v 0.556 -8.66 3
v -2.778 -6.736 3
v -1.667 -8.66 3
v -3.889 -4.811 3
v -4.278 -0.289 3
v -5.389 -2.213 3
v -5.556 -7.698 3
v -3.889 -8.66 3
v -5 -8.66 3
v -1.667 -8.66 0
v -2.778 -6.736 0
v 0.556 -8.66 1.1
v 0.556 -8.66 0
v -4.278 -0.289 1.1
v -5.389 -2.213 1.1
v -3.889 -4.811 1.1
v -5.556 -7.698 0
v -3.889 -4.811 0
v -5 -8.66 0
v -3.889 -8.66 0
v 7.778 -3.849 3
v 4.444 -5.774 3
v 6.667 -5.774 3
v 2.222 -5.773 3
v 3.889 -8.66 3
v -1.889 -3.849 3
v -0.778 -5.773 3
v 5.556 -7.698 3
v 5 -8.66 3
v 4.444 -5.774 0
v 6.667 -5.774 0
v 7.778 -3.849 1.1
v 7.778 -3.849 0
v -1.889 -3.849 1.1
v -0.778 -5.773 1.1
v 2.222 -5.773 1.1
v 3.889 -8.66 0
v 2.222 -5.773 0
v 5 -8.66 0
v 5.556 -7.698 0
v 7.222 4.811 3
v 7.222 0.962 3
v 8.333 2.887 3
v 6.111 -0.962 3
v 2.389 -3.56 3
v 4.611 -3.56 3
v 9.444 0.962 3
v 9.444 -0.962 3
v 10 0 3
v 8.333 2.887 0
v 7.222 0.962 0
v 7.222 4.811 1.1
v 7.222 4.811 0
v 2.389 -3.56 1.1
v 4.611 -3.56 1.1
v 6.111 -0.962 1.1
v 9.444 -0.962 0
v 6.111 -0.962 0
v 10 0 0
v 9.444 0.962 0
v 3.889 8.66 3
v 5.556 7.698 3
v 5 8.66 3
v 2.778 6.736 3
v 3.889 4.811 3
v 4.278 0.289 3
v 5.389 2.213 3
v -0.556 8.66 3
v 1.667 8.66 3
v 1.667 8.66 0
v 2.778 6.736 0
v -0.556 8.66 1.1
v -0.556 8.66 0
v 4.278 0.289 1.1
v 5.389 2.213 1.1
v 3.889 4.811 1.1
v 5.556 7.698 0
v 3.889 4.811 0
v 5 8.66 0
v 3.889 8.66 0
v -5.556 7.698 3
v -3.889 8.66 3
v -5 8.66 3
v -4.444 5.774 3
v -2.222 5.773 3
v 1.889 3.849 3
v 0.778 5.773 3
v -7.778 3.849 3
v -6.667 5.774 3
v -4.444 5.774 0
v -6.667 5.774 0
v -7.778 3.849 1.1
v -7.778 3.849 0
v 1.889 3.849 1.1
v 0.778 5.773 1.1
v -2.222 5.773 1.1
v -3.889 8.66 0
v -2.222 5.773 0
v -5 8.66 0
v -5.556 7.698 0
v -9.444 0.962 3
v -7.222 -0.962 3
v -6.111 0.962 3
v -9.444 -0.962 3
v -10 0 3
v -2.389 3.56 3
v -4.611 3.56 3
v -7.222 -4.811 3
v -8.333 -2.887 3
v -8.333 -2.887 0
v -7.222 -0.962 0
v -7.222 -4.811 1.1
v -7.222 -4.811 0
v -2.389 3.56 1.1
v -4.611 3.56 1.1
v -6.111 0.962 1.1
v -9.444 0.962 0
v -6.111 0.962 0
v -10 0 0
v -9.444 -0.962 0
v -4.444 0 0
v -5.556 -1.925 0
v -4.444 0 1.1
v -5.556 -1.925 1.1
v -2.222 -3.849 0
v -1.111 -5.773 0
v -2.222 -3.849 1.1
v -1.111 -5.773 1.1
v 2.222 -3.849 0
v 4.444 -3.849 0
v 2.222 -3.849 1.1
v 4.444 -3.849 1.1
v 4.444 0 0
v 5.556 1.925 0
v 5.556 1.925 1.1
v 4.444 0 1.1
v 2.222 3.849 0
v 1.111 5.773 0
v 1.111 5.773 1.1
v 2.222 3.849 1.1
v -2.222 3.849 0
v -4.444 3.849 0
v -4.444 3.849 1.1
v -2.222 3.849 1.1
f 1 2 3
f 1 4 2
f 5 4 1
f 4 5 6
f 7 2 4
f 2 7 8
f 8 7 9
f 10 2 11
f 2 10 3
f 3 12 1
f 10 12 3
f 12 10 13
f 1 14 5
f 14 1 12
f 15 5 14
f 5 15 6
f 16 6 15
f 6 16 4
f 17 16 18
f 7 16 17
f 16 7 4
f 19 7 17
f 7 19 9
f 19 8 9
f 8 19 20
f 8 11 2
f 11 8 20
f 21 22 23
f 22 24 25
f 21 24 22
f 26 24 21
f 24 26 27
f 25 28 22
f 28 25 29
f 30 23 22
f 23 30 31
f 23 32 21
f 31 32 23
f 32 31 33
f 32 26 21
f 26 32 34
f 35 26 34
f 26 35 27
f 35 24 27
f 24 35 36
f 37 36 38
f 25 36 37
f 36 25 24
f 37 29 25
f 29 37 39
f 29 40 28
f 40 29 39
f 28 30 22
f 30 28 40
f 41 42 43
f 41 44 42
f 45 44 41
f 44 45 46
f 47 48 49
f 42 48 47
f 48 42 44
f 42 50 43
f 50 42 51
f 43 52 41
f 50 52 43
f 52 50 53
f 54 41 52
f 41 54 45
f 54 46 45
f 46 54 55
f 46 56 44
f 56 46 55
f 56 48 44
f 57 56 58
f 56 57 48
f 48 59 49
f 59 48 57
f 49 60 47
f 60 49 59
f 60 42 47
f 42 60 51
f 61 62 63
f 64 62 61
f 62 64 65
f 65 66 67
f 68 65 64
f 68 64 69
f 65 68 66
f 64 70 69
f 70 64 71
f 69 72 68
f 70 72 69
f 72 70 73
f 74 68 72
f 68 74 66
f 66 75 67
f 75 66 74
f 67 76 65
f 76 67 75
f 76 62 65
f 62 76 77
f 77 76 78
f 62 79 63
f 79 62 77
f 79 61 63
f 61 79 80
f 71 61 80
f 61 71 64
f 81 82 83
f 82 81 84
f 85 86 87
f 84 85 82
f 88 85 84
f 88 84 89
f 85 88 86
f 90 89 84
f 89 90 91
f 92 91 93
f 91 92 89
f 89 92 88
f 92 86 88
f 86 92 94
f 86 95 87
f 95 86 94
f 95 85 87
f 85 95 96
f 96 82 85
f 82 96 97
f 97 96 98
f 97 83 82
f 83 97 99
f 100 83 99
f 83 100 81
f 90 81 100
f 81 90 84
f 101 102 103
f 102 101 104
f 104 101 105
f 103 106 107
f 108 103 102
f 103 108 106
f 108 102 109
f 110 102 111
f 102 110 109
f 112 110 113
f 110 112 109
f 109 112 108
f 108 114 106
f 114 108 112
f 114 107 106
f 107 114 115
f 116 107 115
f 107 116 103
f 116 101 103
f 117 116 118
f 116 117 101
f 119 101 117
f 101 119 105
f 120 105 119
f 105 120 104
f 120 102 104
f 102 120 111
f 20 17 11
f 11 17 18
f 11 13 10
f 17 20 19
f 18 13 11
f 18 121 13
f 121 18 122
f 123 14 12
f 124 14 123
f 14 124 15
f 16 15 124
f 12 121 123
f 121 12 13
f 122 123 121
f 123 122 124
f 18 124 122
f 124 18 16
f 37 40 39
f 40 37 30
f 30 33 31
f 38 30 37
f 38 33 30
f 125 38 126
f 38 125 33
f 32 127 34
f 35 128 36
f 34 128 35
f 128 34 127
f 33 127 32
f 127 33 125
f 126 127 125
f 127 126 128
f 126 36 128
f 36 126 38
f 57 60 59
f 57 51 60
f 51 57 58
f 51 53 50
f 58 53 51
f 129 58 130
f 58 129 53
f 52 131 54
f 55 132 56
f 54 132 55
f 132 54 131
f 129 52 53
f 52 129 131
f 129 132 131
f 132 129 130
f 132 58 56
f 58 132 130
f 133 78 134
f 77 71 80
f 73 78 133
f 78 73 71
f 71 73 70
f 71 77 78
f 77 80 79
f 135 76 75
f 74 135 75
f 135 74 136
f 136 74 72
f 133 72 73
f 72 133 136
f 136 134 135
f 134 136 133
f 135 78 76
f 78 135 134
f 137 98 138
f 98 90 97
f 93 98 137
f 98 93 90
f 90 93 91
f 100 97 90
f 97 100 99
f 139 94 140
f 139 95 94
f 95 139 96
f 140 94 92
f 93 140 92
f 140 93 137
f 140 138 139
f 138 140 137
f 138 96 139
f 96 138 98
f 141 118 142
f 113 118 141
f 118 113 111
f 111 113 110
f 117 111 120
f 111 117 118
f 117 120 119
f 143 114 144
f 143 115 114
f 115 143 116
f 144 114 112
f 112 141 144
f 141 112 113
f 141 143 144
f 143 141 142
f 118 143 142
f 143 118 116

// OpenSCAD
// file: parametric-flake.scad
unit = [1, 0];
origin = [0, 0];


/*
    Returns a 2D rotation matrix given an angle.
*/
function rot2d(angle) = [
    [+cos(angle), -sin(angle)],
    [+sin(angle), +cos(angle)]
];


/*
    Calculates the points for a hexagon.
    Used to reference off of for creating the lambda.
    Points are created starting from the right and moving counter-clockwise.

         2   1

      3         0

         4   5
*/
function inner_hex_points(data) = [
    for (angle = [0 : 60 : 300]) 
    dict_get(data, "scale") * rot2d(angle) * unit
];



/*
    Calculates the points for making a lambda.
*/
function lambda_points(data) =
let (
    hex_points = inner_hex_points(data),
    thickness = dict_get(data, "thickness") / 2,
    top_left = hex_points[2],
    bottom_left = hex_points[4],
    bottom_right = hex_points[5],
    v_0 = thickness * unit,
    v_p60 = thickness * rot2d(60) * unit,
    v_n60 = thickness * rot2d(-60) * unit,
    v_n90 = thickness * rot2d(-90) * unit,
    gap = dict_get(data, "gap") * rot2d(-60) * unit
)
[
    [
        top_left + v_p60,
    ],
    [
        top_left - v_p60 + gap,
        top_left + v_p60 + gap,
        bottom_right + v_0,
        bottom_right - v_0,
        sqrt(3) * v_n90,
        bottom_left + v_0,
        bottom_left,
        bottom_left - v_n60,
        -v_0
    ]
];


/*
    Generates a single lambda at the origin.
*/
module lambda(data) {
    new_data = update_params(data);
    linear_extrude(dict_get(new_data, "height"))
    polygon(lambda_points(new_data)[1]);
}


/*
    Generates a NixOS flake.
*/
module flake(data) {
    new_data = update_params(data);
    for (idx = [0 : 5]) {
        rotate([0, 0, idx * 60]) 
        translate(-lambda_points(new_data)[0][0])
        translate([-dict_get(new_data, "scale"), 0, 0])
        linear_extrude(dict_get(new_data, "height"))
        polygon(lambda_points(new_data)[1]);
    }
}


/*
    Returns the value from a associative array/dictionary type structure given some key.

    Values can be of any type.
    The dictionary must of be of the form:
    [
        [ "key0", <value0> ],
        [ "key1", <value1> ],
        ...
    ]
*/
function dict_get(dict, key) =
  dict[search([key], dict)[0]][1];


/*
    Updates the user parameters so the flake is unit size when `scale = 1`.
*/
function update_params(data) = let
    // factor was empirically found. It gives a flake that is circumscribed by the unit circle.
    (factor = 2.25) [
    [ "gap", 0.75 * dict_get(data, "scale") * dict_get(data, "gap") / factor ],
    [ "height", dict_get(data, "height") ],
    [ "scale", dict_get(data, "scale") / factor ],
    [ "thickness", dict_get(data, "scale") * dict_get(data, "thickness") / factor ],
];


/*
    The parameters for generating a NixOS flake.

    `gap` - The gap between lambdas.
    `height` - The z-height of the flake.
    `scale` - The radial (x,y) size of the flake.
    `thickness` - The thickness of the lambda legs.

    `scale` updates `gap` and `thickness` so there is no need to compesate these values.
    A `gap` of 0 will leave no gap between the lambdas.
    A `gap` of 1 will remove the top portion of the long lambda leg until the point where the two lambda legs intersect.

    A `gap` of 0.05 to 0.15 is a good value for replicating the official NixOS flake.
    A `thickness` of 0.5 is a good value for replicating the official NixOS flake.
    OpenSCAD doesn't have a concept of units so use `scale` and `height` values in the desired ratio.
*/
params = [
    [ "gap", 0.1 ],
    [ "height", 1 ],
    [ "scale", 10 ],
    [ "thickness", 0.5 ],
];


flake(params);
// main file
use <parametric-flake.scad>

params_top = [
    [ "gap", 0.1 ],
    [ "height", 2 ],
    [ "scale", 10 ],
    [ "thickness", 0.5 ],
];

params_bottom = [
    [ "gap", 0 ],
    [ "height", 1.1 ],
    [ "scale", 10 ],
    [ "thickness", 0.5 ],
];

union() {
    translate([0, 0, 1]) flake(params_top);
    flake(params_bottom);
}
